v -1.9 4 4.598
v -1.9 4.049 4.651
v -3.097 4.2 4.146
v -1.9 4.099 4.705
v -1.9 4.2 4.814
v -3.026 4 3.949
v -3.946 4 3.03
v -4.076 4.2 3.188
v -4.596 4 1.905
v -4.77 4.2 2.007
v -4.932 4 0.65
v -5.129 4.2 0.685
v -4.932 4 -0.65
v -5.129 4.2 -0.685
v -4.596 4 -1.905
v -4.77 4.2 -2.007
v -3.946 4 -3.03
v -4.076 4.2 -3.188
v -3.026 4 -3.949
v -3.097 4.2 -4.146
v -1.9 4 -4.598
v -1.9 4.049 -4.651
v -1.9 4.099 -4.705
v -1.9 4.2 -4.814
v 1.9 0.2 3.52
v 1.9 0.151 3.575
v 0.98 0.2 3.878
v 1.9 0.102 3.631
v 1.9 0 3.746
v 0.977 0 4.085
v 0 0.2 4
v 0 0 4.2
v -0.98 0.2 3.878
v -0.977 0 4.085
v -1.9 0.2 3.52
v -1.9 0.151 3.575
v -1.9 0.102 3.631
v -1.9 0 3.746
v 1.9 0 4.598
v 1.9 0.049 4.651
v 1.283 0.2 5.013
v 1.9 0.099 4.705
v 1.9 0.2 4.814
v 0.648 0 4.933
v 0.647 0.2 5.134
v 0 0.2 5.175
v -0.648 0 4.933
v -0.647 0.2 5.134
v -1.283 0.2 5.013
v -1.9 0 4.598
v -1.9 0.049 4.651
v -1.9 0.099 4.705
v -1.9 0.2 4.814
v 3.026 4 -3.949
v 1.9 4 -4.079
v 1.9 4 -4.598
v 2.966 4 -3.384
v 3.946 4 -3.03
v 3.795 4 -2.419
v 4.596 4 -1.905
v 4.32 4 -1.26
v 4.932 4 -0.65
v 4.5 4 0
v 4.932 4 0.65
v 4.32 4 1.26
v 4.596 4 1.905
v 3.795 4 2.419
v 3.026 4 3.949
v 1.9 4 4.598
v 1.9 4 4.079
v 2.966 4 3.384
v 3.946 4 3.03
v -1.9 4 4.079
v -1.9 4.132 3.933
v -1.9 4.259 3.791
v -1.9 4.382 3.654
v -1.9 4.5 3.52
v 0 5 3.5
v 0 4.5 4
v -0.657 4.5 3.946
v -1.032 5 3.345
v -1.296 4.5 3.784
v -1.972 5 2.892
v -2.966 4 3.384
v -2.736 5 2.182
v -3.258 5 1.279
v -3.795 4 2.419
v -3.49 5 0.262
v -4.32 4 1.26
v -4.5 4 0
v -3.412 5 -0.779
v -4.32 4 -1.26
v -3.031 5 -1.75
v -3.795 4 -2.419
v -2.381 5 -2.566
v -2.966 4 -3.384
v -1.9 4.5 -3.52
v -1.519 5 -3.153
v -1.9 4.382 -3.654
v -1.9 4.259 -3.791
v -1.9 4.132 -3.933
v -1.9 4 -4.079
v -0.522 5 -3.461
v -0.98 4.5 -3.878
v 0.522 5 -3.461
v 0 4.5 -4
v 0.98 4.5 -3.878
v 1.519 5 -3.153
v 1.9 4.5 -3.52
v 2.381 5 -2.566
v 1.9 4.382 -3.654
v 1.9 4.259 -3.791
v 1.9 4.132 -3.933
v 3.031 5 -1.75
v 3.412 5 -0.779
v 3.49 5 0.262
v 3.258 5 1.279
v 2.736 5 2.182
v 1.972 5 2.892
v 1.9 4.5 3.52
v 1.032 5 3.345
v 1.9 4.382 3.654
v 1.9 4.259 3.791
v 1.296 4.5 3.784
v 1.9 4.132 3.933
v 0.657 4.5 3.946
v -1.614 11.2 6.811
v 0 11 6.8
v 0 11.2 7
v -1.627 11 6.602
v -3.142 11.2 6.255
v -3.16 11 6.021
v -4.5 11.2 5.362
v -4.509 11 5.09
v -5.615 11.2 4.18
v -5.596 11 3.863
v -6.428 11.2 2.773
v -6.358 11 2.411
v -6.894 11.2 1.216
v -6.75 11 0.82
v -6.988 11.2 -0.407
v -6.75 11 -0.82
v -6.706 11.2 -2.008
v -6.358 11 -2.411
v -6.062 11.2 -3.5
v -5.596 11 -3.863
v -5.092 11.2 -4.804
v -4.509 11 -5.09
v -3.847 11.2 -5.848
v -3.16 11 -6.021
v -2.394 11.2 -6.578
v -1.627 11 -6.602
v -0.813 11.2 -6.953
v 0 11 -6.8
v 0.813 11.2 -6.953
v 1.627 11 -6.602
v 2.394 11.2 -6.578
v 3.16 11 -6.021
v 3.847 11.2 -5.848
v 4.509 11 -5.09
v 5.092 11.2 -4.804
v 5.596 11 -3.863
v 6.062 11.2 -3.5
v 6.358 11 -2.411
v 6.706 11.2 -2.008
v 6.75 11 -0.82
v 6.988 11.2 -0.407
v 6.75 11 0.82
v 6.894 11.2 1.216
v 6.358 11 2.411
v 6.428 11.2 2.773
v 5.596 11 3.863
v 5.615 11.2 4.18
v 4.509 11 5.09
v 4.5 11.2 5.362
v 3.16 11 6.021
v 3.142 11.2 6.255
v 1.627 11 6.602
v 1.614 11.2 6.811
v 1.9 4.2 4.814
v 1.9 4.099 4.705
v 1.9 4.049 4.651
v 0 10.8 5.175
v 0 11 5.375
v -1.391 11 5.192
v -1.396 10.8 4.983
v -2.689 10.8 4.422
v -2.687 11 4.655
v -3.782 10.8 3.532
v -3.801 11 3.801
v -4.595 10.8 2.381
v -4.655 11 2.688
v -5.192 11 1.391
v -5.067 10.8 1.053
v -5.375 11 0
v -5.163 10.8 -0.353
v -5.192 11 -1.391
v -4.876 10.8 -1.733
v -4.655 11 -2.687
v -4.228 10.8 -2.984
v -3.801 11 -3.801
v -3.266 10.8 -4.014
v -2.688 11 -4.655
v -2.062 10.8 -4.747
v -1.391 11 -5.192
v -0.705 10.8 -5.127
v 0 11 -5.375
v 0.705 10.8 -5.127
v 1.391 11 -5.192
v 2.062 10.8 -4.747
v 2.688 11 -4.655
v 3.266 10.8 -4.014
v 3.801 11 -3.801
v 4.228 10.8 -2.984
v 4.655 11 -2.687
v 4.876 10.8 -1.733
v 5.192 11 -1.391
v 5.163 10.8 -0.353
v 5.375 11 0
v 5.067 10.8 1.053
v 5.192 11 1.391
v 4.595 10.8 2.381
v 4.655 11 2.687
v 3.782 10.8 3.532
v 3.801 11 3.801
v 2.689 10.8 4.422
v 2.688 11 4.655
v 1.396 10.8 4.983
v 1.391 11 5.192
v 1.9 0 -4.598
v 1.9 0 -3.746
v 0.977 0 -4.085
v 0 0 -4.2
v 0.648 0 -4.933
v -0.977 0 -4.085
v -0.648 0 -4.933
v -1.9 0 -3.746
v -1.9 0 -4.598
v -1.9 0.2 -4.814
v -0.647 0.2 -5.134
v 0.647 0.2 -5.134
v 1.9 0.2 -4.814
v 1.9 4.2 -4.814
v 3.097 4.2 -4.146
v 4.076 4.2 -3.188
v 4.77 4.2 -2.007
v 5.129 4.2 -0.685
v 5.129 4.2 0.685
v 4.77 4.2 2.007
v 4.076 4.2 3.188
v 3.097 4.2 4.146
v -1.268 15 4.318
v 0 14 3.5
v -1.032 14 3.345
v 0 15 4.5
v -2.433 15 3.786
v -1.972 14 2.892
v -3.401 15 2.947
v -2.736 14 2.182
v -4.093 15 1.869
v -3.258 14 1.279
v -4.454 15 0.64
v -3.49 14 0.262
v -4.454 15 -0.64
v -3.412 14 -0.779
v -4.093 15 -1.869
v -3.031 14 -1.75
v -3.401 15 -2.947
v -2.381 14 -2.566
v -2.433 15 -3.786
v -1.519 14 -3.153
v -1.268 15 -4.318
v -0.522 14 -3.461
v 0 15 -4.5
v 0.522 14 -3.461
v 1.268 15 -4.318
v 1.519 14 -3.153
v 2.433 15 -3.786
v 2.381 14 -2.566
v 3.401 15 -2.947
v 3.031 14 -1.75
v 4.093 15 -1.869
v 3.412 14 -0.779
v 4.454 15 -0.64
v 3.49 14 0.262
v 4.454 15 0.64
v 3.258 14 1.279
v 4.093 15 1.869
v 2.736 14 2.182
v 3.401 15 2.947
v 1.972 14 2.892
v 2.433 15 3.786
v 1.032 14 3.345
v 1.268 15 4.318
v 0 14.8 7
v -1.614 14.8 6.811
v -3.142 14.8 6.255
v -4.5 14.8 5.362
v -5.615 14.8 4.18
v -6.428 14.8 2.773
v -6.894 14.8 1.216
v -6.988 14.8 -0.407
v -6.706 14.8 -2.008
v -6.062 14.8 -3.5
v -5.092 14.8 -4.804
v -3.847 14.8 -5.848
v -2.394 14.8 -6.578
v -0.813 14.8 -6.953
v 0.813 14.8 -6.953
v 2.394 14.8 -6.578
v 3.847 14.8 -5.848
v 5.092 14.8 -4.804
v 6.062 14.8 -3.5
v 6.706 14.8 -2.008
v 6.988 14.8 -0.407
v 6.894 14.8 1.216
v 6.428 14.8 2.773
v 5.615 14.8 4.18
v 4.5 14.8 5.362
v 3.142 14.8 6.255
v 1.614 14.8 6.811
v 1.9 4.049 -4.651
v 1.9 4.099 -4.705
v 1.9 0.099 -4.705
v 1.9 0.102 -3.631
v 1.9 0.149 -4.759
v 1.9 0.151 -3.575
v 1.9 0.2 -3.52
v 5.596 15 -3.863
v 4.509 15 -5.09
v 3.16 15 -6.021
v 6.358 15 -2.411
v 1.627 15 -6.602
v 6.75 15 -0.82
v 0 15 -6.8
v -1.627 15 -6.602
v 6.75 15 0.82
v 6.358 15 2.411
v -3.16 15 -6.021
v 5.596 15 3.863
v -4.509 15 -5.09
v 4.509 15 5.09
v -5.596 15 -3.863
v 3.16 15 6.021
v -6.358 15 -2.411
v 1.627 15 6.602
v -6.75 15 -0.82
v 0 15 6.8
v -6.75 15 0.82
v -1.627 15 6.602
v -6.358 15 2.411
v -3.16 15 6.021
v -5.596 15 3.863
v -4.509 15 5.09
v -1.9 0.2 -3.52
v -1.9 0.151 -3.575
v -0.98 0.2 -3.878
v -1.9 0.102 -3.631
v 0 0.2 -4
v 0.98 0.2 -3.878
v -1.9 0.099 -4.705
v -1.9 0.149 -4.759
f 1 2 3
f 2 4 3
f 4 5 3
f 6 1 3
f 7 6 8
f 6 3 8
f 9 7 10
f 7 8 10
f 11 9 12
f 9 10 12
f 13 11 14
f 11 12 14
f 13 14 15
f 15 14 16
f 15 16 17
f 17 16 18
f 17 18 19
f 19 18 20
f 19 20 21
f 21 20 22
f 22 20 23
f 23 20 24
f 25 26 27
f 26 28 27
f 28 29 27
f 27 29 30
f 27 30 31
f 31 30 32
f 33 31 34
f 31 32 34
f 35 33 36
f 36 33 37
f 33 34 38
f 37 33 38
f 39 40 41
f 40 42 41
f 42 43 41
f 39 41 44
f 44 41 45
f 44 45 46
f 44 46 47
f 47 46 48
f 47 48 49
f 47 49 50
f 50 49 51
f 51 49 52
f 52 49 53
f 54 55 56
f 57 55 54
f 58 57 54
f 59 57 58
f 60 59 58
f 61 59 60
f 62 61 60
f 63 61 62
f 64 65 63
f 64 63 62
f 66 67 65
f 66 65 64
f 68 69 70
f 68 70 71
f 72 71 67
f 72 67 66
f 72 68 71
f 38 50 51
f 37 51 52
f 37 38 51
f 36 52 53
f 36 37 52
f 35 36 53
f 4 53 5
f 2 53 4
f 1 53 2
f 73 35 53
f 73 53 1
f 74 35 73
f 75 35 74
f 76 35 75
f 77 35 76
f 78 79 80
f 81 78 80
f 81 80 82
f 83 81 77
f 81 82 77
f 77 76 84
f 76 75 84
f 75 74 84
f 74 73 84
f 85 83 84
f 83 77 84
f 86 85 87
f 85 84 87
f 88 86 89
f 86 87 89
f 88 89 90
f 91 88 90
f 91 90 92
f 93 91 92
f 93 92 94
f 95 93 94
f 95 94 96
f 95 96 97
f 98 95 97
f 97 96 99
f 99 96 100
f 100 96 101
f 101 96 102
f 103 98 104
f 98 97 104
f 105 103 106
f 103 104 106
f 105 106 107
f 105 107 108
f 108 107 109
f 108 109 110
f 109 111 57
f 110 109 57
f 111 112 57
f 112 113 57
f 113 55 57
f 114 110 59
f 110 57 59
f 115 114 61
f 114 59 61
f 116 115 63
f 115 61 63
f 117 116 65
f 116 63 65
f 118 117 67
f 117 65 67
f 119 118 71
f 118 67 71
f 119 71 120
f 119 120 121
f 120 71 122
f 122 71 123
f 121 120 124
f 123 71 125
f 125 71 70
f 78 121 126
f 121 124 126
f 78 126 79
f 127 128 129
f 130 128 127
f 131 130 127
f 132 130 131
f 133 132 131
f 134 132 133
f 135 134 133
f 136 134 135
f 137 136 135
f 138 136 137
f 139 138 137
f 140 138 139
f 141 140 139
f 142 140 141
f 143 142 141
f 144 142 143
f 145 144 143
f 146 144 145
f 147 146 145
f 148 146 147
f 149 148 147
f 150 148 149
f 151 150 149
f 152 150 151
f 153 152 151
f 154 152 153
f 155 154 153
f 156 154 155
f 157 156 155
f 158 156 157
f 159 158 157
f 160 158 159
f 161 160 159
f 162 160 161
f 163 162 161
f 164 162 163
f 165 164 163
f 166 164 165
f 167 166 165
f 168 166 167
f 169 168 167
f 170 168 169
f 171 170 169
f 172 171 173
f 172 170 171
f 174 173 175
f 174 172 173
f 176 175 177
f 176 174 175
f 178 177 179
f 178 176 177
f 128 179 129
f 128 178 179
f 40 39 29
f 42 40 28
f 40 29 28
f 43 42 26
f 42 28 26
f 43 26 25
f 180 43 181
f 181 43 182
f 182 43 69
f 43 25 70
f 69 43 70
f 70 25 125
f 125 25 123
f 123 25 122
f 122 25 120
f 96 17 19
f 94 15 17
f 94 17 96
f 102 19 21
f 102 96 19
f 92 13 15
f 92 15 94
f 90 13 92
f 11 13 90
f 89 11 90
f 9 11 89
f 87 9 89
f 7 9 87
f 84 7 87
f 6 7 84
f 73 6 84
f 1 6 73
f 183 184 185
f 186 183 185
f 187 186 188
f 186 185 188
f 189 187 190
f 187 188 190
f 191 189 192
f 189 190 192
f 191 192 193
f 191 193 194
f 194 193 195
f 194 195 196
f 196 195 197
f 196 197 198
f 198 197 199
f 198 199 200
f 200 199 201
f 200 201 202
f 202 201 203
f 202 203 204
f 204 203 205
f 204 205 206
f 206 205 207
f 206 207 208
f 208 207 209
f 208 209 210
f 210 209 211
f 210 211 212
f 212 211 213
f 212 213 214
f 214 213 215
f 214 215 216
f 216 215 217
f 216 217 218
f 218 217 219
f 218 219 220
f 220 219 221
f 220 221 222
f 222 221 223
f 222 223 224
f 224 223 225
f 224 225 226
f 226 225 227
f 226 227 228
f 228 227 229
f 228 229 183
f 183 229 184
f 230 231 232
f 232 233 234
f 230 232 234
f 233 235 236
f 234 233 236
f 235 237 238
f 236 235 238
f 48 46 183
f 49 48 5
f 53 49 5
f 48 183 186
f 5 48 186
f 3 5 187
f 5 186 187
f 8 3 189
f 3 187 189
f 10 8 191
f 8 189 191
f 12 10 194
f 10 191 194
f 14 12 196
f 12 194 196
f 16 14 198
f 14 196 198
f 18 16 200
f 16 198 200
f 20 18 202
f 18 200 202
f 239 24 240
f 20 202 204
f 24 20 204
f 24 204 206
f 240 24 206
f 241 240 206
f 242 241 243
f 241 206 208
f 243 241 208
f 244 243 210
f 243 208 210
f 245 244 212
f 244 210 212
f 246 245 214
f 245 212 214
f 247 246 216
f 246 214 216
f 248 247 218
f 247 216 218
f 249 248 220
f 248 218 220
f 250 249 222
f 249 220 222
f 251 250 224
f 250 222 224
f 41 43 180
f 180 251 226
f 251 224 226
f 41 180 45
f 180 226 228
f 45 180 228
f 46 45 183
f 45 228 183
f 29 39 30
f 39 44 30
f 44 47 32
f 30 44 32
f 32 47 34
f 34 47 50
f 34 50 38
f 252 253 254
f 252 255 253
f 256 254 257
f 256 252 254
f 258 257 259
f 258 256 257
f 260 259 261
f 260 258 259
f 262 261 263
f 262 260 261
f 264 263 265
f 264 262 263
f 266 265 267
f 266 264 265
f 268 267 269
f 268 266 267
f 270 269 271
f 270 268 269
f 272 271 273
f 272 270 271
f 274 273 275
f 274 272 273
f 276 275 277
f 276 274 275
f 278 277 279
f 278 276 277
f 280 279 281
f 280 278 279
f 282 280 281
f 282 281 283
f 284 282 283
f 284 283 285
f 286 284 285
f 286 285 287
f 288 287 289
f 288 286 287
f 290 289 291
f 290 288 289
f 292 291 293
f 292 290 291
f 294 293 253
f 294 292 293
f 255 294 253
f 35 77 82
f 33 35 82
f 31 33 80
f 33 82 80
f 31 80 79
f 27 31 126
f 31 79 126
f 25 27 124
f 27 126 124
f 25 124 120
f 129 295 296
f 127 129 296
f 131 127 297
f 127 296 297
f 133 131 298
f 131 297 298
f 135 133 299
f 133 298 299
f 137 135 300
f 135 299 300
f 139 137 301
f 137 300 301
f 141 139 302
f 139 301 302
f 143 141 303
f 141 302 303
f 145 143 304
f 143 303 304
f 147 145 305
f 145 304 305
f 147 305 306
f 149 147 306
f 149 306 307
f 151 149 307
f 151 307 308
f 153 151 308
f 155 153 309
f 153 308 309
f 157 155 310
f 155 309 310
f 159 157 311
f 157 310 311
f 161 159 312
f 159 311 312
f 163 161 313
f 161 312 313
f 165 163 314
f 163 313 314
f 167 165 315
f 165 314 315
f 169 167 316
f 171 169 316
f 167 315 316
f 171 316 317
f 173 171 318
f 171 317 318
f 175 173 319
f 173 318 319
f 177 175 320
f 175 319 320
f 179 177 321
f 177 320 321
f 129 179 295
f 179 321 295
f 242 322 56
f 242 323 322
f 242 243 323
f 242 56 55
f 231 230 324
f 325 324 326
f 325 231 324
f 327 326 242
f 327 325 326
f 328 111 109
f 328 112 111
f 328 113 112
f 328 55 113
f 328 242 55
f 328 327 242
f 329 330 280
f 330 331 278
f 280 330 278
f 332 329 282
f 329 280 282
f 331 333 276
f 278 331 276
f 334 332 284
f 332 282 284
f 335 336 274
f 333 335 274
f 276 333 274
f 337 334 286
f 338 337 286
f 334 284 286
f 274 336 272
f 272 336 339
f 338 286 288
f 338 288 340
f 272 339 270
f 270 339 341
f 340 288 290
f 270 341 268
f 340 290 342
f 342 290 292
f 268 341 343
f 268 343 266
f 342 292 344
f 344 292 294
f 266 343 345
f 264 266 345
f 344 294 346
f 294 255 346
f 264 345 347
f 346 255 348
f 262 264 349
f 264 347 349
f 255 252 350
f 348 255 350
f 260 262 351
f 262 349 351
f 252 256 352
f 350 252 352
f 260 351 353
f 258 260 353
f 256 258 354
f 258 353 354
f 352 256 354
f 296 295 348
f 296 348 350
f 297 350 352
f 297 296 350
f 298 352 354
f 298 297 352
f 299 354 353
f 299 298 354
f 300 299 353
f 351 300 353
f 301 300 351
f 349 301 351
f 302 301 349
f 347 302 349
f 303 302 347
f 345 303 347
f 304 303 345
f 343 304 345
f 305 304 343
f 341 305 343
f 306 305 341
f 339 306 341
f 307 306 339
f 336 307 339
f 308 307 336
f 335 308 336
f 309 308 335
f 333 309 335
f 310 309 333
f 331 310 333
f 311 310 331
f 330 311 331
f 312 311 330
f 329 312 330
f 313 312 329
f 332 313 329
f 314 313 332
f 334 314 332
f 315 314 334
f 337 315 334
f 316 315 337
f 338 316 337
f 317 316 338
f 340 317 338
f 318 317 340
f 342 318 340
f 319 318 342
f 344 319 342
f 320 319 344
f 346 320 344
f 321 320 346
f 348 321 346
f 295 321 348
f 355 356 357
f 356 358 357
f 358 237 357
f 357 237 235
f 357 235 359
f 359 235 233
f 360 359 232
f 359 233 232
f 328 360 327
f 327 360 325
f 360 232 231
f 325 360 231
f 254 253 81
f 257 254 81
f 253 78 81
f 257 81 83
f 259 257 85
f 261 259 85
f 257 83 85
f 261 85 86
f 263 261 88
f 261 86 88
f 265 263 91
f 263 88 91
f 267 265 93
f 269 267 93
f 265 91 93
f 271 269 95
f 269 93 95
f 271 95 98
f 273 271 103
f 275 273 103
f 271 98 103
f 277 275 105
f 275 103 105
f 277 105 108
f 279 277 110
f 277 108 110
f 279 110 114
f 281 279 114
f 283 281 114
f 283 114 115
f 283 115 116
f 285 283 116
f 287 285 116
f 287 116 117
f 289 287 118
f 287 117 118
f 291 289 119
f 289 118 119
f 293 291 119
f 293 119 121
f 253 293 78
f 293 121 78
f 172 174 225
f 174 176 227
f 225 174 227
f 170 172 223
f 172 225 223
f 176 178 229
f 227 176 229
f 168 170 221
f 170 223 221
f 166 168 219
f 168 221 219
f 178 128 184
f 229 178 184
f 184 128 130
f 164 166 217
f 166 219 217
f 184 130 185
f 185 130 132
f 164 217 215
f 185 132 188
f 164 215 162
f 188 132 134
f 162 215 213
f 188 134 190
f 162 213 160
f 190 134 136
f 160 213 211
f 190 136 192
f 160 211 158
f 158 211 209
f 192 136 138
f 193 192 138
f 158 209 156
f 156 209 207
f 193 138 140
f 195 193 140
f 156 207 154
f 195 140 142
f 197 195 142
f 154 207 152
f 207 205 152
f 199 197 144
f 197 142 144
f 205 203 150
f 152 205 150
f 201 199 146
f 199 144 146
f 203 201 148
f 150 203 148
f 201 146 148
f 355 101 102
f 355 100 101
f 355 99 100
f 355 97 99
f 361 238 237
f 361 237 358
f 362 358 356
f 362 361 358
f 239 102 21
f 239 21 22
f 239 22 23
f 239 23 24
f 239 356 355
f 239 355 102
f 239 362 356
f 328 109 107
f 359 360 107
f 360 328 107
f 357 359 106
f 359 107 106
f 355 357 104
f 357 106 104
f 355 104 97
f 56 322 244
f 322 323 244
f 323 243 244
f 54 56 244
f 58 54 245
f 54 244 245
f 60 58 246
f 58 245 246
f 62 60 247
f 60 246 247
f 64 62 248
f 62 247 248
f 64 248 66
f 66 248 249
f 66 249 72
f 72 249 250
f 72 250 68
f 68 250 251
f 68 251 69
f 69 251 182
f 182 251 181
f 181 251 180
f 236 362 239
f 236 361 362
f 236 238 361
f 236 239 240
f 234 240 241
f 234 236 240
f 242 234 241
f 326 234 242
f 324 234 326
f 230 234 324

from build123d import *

# Parameters (mm, degrees)
CUT_EXTRUDE_1_DEPTH      = 18.972200756
CUT_EXTRUDE_1_DEPTH_BACK = 18.972200756
SKETCH_2_W               = 3.275
SKETCH_2_H               = 4
SKETCH_3_R               = 4
CUT_EXTRUDE_2_DEPTH      = 4
CHAMFER_1_SIZE           = 1
CHAMFER_2_SIZE           = 0.2


with BuildPart() as part:
    # Эскиз1 → Повернуть1 (revolve)
    with BuildSketch(Plane(origin=(0, 0, 0), x_dir=(0, 0, -1), z_dir=(1, 0, 0)), mode=Mode.PRIVATE) as revolve_1_sk:
        Polygon((3.5, 15), (3.5, 0), (5.175, 0), (5.175, 11), (7, 11), (7, 15), align=None)
    revolve(revolve_1_sk.sketch.rotate(Axis((0, 26.762195122, 0), (0, -1, 0)), 180), axis=Axis((0, 26.762195122, 0), (0, -1, 0)))

    # Эскиз2 → Вырез-Вытянуть1 (cut, two sides: drawn at the far end of the back side and taken through both)
    with BuildSketch(Plane.XY.offset(-CUT_EXTRUDE_1_DEPTH_BACK)):
        with Locations((3.5375, 2)):
            Rectangle(SKETCH_2_W, SKETCH_2_H)
        with Locations((-3.5375, 2)):
            Rectangle(SKETCH_2_W, SKETCH_2_H)
    extrude(amount=CUT_EXTRUDE_1_DEPTH + CUT_EXTRUDE_1_DEPTH_BACK, mode=Mode.SUBTRACT)

    # Эскиз3 → Вырез-Вытянуть2 (cut)
    with BuildSketch(Plane.XZ.offset(-4)):
        Circle(SKETCH_3_R)
    extrude(amount=CUT_EXTRUDE_2_DEPTH, mode=Mode.SUBTRACT)

    # Фаска1
    # the kernel refuses this chamfer: 1 mm, written as the material it takes off along each edge
    with BuildSketch(Plane(origin=(0, 4, 0), x_dir=(0, 0, 1), z_dir=(1, 0, 0))) as chamfer_1_piece_1_section:
        Polygon((3.5, -CHAMFER_1_SIZE), (3.5 + CHAMFER_1_SIZE, 0), (3.5, 0), align=None)
    chamfer_1_piece_1 = revolve(axis=Axis((0, 4, 0), (0, -1, 0)), mode=Mode.PRIVATE)
    chamfer_1_piece_1 = chamfer_1_piece_1 & Plane(origin=(0, 4.334033243, 0), x_dir=(1, 0, 0), z_dir=(0, 1, 0)) * Cylinder(4, 19, mode=Mode.PRIVATE)
    add(chamfer_1_piece_1, mode=Mode.SUBTRACT)
    with BuildSketch(Plane(origin=(0, 4, 0), x_dir=(0, 0, 1), z_dir=(1, 0, 0))) as chamfer_1_piece_2_section:
        Polygon((3.5, -CHAMFER_1_SIZE), (3.5 + CHAMFER_1_SIZE, 0), (3.5, 0), align=None)
    chamfer_1_piece_2 = revolve(axis=Axis((0, 4, 0), (0, -1, 0)), mode=Mode.PRIVATE)
    chamfer_1_piece_2 = split(chamfer_1_piece_2, bisect_by=Plane(origin=(-1.9, 4.24260685, 0), z_dir=(-1, 0, 0)), keep=Keep.TOP, mode=Mode.PRIVATE)
    add(chamfer_1_piece_2, mode=Mode.SUBTRACT)
    with BuildSketch(Plane(origin=(0, 4, 0), x_dir=(0, 0, 1), z_dir=(1, 0, 0))) as chamfer_1_piece_3_section:
        Polygon((3.5, -CHAMFER_1_SIZE), (3.5 + CHAMFER_1_SIZE, 0), (3.5, 0), align=None)
    chamfer_1_piece_3 = revolve(axis=Axis((0, 4, 0), (0, -1, 0)), mode=Mode.PRIVATE)
    chamfer_1_piece_3 = split(chamfer_1_piece_3, bisect_by=Plane(origin=(1.9, 4.24260685, 0), z_dir=(1, 0, 0)), keep=Keep.TOP, mode=Mode.PRIVATE)
    add(chamfer_1_piece_3, mode=Mode.SUBTRACT)
    with BuildSketch(Plane(origin=(0, 15, 0), x_dir=(0, 0, 1), z_dir=(1, 0, 0))) as chamfer_1_piece_4:
        Polygon((3.5, CHAMFER_1_SIZE), (3.5 + CHAMFER_1_SIZE, 0), (3.5, 0), align=None)
    revolve(axis=Axis((0, 15, 0), (0, -1, 0)), mode=Mode.SUBTRACT)

    # Фаска2
    chamfer_2_edges = [part.edges().sort_by_distance(p)[0] for p in [
        (0, 0, -5.175),
        (5.175, 4, 0),
        (0.967033992, 0, 5.083844043),
        (-5.175, 4, 0),
        (0, 15, -7),
        (0, 11, -7),
        (0, 11, -5.175),
        (0, 0, -4),
        (0, 0, 4),
    ]]
    chamfer(chamfer_2_edges, length=CHAMFER_2_SIZE)


solid = part.part
